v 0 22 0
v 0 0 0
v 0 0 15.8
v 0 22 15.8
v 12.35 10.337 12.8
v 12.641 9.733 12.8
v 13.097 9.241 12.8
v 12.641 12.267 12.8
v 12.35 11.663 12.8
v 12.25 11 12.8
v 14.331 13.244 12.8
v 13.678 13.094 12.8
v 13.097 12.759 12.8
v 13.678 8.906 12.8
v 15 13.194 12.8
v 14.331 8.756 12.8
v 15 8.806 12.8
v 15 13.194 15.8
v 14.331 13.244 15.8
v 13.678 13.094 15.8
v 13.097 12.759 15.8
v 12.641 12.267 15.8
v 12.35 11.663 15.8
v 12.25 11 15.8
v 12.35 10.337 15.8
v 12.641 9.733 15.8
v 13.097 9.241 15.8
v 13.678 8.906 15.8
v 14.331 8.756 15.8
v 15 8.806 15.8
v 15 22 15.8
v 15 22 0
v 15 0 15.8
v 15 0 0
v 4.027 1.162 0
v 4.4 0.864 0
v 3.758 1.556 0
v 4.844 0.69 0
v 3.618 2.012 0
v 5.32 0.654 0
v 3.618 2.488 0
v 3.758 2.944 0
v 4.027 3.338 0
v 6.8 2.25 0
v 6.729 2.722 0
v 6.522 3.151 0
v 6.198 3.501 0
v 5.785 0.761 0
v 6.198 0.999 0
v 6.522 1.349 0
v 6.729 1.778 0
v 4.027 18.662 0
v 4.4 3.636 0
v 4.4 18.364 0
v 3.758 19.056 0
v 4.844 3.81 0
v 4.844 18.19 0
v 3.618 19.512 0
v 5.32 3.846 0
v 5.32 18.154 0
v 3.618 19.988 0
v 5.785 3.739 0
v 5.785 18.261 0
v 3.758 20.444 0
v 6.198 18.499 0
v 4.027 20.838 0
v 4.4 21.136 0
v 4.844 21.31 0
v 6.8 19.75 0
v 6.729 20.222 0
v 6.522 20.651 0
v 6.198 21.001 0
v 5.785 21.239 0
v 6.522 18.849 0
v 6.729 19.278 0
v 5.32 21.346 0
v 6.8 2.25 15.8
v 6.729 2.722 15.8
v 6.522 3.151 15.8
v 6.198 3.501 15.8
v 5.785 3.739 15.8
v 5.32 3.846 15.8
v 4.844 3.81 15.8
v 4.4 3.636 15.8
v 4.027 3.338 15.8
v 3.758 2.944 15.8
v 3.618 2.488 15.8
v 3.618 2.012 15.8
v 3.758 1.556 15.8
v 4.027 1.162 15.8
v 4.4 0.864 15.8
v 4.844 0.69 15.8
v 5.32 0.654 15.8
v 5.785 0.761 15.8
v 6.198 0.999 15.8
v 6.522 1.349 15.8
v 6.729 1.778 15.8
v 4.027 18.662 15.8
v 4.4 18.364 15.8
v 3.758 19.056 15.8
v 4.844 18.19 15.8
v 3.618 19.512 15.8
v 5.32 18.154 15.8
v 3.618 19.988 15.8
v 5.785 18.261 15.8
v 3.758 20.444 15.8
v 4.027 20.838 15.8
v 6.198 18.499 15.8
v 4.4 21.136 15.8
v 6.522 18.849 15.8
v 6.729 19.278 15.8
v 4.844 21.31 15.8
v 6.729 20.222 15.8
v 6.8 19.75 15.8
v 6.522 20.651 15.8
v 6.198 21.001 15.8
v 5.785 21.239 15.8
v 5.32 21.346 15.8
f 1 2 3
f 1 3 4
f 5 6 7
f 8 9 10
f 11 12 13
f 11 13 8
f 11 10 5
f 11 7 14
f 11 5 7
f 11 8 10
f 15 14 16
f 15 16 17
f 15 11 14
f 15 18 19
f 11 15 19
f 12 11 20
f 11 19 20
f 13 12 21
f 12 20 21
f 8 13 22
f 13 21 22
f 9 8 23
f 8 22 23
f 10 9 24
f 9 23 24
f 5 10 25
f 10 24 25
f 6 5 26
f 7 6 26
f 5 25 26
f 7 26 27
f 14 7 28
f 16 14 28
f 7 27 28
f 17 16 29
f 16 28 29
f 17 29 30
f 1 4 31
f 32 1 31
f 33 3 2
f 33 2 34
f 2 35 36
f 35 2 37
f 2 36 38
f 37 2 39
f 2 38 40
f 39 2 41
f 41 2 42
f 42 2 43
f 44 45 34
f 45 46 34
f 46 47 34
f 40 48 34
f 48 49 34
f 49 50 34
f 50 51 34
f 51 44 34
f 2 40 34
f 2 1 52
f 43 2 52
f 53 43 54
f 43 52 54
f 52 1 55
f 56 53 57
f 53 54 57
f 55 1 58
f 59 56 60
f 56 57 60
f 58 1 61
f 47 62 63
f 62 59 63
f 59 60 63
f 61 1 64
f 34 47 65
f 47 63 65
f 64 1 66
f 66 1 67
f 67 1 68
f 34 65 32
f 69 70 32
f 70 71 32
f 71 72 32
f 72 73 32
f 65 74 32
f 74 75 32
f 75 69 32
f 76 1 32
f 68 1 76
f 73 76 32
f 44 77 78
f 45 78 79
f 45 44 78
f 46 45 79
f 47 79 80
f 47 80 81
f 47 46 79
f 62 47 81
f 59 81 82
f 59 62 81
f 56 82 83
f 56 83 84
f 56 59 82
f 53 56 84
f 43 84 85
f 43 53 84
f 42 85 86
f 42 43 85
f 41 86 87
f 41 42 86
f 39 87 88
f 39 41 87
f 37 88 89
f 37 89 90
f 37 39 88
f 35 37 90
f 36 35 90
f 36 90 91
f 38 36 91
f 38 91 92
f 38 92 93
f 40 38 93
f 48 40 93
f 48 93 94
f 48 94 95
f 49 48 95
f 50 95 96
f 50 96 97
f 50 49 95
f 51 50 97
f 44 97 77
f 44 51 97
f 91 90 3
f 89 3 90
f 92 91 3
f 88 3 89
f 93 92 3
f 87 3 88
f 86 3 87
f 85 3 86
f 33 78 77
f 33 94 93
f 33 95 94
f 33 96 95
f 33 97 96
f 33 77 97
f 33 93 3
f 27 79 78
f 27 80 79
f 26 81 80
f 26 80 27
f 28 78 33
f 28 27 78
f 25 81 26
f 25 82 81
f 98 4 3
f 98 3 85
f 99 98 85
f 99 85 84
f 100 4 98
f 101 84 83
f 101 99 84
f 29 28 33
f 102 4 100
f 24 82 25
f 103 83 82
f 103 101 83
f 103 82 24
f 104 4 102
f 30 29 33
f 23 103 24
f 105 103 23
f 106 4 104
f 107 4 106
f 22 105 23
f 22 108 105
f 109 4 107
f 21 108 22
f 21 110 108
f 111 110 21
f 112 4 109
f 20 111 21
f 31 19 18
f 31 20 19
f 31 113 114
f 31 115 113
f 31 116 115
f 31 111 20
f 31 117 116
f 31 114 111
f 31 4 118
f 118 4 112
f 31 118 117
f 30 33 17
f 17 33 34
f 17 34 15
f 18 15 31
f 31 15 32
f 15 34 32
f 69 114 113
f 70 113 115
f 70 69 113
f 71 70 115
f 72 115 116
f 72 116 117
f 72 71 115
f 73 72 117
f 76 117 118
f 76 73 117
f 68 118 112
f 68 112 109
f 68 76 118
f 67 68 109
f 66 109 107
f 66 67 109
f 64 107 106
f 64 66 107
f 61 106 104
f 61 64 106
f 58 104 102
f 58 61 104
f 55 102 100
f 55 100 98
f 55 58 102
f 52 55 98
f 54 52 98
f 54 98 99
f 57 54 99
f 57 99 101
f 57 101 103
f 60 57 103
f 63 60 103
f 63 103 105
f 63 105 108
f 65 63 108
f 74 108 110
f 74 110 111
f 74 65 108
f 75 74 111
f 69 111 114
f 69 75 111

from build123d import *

# Parameters (mm, degrees)
SKETCH_1_W          = 15
SKETCH_1_H          = 22
SKETCH_1_R          = 1.6
EXTRUDE_1_DEPTH     = 15.8
SKETCH_2_R          = 2.25
CUT_EXTRUDE_1_DEPTH = 3


with BuildPart() as part:
    # Эскиз1 → Бобышка-Вытянуть1 (new body)
    with BuildSketch(Plane.XY):
        with Locations((7.5, 11)):
            Rectangle(SKETCH_1_W, SKETCH_1_H)
        with Locations((5.2, 19.75)):
            Circle(SKETCH_1_R, mode=Mode.SUBTRACT)
        with Locations((5.2, 2.25)):
            Circle(SKETCH_1_R, mode=Mode.SUBTRACT)
    extrude(amount=EXTRUDE_1_DEPTH)

    # Эскиз2 → Вырез-Вытянуть1 (cut)
    with BuildSketch(Plane.XY.offset(15.8)):
        with Locations((14.5, 11)):
            Circle(SKETCH_2_R)
    extrude(amount=-CUT_EXTRUDE_1_DEPTH, mode=Mode.SUBTRACT)


solid = part.part
